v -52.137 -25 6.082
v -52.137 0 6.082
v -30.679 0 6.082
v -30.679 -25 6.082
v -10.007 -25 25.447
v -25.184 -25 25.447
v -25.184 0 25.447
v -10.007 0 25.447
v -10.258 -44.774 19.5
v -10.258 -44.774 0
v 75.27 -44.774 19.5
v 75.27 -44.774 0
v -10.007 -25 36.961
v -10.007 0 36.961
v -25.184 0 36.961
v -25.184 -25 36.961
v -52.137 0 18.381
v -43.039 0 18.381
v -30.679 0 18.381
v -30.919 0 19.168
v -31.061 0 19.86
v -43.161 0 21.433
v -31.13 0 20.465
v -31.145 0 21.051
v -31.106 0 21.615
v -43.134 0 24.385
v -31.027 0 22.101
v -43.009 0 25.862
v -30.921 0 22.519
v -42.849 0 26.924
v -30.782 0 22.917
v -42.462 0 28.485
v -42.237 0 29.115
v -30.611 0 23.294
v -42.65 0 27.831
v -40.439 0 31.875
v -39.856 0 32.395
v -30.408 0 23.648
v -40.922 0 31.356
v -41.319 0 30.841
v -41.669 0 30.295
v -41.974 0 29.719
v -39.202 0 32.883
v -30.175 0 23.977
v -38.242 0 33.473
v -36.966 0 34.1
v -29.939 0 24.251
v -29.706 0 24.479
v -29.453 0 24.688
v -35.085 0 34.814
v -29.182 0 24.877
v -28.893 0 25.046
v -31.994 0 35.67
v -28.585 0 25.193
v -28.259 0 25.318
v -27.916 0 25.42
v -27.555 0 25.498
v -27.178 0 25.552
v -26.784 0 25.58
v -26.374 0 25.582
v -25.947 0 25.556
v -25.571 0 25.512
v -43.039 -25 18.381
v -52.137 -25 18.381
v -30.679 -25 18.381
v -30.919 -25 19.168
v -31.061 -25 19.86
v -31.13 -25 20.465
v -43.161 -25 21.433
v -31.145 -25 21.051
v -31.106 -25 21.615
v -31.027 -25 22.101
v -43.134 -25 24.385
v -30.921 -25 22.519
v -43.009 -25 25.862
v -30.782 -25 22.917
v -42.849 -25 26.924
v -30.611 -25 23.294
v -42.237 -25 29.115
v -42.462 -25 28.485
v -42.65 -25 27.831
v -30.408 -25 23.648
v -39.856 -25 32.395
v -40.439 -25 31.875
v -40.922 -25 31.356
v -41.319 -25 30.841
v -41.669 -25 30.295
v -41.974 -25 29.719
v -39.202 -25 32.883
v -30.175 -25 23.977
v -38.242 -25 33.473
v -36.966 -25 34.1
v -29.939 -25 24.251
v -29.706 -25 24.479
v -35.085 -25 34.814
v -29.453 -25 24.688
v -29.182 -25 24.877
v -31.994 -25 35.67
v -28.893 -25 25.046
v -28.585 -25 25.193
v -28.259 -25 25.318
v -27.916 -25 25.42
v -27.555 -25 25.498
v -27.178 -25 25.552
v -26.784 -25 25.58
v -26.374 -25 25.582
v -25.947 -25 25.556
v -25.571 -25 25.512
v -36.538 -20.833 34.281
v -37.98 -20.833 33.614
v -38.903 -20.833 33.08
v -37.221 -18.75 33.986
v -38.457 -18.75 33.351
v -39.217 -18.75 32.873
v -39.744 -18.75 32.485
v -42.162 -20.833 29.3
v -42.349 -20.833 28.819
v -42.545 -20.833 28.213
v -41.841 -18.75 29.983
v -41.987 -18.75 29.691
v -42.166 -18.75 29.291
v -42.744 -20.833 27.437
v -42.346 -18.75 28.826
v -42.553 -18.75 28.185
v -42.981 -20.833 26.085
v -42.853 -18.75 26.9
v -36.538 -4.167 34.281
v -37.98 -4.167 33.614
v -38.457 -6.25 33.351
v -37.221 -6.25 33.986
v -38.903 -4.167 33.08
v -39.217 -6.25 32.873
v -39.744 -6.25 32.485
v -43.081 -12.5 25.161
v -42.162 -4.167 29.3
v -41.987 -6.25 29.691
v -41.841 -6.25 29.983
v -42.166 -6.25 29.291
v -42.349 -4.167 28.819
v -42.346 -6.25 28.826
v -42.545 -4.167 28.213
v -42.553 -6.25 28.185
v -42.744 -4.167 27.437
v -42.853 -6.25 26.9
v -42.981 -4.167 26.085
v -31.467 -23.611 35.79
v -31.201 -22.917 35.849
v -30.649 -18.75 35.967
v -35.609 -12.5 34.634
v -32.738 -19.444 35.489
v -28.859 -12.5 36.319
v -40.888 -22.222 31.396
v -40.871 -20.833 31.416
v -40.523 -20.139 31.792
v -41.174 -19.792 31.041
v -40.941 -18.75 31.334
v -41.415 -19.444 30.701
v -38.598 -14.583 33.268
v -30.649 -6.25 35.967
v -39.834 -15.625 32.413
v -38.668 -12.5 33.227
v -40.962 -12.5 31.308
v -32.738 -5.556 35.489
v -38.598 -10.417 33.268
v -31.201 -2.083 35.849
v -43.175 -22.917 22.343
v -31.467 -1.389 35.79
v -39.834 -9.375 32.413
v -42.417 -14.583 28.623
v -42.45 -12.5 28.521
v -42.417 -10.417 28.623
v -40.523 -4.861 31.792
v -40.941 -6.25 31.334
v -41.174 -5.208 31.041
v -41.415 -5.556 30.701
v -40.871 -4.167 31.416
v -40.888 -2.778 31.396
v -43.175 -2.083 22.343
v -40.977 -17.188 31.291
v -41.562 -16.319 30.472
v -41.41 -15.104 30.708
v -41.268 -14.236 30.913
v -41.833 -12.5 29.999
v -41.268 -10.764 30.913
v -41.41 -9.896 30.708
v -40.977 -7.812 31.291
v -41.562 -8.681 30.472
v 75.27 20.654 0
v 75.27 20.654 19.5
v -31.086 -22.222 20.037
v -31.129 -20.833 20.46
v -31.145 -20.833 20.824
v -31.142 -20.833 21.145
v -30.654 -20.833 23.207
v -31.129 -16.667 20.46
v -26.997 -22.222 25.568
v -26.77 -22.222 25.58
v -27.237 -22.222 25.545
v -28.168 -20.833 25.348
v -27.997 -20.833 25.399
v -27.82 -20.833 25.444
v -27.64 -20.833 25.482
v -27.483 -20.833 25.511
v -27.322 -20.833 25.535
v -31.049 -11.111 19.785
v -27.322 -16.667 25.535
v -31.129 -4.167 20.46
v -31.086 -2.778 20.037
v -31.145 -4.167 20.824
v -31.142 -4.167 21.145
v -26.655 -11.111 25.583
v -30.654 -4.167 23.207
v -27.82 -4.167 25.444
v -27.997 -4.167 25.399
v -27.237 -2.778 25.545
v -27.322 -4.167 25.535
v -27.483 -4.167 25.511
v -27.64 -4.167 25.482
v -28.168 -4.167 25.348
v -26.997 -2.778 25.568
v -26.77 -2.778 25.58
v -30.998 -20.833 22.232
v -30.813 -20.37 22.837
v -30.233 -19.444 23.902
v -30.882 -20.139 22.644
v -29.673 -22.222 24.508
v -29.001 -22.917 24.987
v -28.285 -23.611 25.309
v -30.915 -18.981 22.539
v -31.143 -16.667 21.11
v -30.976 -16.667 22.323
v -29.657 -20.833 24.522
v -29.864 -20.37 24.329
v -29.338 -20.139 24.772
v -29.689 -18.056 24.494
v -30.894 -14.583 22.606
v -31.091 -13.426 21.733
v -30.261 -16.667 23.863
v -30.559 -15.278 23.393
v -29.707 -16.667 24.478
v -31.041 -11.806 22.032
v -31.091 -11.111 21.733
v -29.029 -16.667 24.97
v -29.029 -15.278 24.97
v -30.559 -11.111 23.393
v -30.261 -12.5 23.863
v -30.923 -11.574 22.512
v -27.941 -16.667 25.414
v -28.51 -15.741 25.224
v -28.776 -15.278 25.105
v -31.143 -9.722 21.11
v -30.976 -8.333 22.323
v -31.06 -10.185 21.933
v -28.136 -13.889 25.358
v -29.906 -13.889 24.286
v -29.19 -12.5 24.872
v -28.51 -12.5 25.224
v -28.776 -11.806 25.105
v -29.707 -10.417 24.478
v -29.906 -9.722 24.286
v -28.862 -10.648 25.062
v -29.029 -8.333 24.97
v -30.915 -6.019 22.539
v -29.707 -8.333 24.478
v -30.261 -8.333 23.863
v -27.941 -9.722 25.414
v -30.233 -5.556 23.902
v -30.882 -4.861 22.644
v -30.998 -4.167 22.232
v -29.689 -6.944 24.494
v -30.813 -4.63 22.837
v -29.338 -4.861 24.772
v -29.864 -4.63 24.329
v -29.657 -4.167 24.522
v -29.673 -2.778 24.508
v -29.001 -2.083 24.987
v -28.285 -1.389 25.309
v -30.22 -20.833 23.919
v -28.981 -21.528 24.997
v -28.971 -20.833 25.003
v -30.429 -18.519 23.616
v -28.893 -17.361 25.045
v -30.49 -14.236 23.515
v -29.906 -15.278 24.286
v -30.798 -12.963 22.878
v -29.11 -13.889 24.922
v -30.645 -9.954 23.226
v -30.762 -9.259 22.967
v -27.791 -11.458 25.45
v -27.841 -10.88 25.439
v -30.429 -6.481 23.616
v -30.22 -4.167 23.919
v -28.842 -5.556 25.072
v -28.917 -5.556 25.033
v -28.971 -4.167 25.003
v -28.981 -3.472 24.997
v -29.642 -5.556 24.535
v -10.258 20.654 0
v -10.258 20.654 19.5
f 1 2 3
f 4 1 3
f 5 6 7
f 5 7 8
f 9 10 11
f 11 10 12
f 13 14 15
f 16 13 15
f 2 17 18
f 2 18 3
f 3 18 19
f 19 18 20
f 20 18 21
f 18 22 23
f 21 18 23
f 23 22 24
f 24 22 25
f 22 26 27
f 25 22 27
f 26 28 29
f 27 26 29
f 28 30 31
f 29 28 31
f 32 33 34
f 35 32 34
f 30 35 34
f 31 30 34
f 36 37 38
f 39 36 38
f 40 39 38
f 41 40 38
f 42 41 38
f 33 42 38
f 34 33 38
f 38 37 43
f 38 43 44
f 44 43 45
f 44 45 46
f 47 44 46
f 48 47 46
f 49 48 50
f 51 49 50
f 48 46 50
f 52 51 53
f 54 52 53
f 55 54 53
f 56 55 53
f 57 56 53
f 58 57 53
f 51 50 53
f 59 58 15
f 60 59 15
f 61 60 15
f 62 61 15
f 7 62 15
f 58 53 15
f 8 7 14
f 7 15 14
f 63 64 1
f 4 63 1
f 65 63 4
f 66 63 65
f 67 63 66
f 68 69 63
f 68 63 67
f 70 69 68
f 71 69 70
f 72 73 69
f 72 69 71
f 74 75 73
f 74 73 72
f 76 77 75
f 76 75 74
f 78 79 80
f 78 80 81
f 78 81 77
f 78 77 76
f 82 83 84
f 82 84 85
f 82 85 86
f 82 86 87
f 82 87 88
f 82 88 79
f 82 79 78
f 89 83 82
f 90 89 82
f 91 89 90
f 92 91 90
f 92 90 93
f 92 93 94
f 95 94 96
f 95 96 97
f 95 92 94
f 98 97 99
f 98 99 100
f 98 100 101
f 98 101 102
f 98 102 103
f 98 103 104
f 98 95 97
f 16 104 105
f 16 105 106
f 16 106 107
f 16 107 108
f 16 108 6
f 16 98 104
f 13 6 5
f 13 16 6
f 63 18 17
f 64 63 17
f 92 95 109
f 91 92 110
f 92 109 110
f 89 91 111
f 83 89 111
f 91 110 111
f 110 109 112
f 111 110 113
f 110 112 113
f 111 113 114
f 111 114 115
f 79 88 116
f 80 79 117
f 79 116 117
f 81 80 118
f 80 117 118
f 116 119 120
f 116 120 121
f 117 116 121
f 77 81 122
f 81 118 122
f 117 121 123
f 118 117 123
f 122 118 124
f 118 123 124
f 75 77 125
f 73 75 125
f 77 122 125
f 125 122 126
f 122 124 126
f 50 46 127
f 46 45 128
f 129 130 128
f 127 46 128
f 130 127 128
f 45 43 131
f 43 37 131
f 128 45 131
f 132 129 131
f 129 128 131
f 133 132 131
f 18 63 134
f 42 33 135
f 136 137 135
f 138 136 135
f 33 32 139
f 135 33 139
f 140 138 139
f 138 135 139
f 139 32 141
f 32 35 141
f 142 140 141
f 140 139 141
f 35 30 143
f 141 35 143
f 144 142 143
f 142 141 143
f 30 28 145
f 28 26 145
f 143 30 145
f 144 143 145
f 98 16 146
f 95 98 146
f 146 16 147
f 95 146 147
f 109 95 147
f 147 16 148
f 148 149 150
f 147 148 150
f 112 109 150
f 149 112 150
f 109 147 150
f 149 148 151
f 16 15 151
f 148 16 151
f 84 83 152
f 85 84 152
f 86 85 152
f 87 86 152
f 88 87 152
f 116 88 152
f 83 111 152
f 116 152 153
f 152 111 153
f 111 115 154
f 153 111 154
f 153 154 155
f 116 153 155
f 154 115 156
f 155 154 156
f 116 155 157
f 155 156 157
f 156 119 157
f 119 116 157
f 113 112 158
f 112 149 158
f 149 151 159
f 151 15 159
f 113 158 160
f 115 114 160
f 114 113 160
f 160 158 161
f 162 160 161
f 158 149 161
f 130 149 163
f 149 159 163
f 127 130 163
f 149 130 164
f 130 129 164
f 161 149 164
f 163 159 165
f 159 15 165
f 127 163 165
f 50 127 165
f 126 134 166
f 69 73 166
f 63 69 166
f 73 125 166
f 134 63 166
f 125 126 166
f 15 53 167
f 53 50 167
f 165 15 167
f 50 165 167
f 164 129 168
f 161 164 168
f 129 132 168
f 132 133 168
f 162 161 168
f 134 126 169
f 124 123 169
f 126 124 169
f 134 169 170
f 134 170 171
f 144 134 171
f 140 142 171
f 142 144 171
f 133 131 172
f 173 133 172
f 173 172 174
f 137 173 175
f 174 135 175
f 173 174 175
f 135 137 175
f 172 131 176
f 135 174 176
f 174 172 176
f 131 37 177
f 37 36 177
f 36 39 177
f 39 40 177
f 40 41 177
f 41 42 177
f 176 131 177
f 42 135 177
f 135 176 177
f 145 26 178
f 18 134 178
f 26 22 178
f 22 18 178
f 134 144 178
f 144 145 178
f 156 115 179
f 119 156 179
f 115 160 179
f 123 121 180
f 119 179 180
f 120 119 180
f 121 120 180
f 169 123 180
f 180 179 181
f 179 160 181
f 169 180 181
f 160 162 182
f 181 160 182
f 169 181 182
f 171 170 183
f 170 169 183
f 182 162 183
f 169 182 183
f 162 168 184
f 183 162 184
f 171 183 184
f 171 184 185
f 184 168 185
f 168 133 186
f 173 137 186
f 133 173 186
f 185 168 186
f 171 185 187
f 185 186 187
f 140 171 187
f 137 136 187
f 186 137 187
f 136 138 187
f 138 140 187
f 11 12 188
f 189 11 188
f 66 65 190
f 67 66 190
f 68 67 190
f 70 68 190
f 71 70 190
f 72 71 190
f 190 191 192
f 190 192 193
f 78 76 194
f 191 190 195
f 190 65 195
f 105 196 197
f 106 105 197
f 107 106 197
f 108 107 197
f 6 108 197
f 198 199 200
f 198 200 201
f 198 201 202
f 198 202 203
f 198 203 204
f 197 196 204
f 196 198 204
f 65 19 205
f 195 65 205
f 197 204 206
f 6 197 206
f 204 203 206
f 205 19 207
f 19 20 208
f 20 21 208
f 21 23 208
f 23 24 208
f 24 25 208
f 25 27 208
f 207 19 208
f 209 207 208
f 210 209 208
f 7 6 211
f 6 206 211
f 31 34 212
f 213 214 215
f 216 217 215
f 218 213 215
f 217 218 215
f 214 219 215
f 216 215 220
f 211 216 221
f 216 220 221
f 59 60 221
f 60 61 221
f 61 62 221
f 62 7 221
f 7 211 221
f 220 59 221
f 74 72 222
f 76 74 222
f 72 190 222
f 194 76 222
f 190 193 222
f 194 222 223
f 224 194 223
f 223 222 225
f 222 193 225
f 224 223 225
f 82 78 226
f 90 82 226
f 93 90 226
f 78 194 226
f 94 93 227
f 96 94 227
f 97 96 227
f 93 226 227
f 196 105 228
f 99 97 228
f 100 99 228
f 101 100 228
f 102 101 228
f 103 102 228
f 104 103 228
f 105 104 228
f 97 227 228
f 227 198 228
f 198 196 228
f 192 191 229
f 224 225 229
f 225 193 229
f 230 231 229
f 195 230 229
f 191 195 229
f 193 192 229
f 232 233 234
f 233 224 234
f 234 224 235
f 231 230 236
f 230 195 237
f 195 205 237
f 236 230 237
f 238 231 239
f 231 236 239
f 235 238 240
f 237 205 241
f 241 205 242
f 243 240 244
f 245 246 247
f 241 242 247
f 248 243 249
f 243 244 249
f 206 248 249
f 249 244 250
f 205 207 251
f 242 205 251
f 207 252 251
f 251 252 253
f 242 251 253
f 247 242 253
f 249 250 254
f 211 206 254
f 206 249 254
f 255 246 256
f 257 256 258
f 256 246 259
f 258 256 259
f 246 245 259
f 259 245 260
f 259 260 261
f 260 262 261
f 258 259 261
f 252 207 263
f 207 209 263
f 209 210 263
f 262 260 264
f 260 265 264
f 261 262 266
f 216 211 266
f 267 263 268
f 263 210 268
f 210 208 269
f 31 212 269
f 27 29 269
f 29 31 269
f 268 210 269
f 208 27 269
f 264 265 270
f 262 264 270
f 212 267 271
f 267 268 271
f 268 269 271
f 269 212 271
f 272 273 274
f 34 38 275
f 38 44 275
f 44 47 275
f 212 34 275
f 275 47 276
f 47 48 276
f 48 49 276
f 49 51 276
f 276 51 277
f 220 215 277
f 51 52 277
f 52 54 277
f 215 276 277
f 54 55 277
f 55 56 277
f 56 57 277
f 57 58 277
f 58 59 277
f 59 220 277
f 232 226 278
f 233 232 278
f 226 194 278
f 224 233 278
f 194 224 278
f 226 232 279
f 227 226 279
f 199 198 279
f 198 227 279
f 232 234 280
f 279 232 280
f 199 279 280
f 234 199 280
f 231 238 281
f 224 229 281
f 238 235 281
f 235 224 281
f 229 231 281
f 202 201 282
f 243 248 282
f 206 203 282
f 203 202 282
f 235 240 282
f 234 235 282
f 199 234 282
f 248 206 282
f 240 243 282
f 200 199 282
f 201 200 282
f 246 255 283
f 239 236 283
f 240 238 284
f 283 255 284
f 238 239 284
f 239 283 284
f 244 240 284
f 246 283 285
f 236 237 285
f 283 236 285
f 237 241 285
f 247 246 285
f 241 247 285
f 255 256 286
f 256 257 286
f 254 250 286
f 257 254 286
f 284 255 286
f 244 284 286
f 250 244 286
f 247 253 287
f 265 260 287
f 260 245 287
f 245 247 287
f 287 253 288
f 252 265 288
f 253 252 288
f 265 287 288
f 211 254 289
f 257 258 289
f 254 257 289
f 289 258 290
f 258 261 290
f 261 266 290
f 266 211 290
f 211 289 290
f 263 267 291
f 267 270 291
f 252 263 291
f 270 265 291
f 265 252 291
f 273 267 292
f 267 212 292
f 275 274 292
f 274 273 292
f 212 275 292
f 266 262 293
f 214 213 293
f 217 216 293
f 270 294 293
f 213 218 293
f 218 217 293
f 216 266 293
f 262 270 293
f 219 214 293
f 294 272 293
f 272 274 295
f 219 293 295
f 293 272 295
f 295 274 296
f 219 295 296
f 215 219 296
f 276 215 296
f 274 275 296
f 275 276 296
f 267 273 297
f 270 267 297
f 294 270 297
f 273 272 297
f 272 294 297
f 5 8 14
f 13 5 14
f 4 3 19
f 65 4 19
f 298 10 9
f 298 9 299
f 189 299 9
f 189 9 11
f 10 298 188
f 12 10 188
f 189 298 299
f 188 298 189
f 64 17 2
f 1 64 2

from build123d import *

# Parameters (mm, degrees)
F1_DEPTH = 25
F2_W     = 85.5280570686
F2_H     = 65.4282718897
F3_DEPTH = 19.5


with BuildPart() as f1:
    # F0 (on Front) → F1 (new body)
    with BuildSketch(Plane.XZ):
        with BuildLine():
            Line((-52.1368719637, 18.3813534677), (-52.1368719637, 6.08182))
            Line((-52.1368719637, 6.08182), (-30.679255724, 6.08182))
            Line((-30.679255724, 6.08182), (-30.679255724, 18.3813534677))
            add(Edge.make_bspline(
                [(-30.679255724, 18.3813534677), (-32.2119481862, 22.6791929454), (-29.8628807068, 26.3472329825), (-25.1840129495, 25.4470407963)],
                knots=[0, 0, 0, 0, 8.9510686834, 8.9510686834, 8.9510686834, 8.9510686834], degree=3))
            Line((-25.1840129495, 25.4470407963), (-10.0066736341, 25.4470407963))
            Line((-10.0066736341, 25.4470407963), (-10.0066736341, 36.9614958763))
            Line((-10.0066736341, 36.9614958763), (-25.1840129495, 36.9614958763))
            add(Edge.make_bspline(
                [(-25.1840129495, 36.9614958763), (-31.6314211359, 35.8709373617), (-43.7773138453, 33.8164983797), (-43.2748553138, 23.3104654925), (-43.0391170084, 18.3813534677)],
                knots=[0, 0, 0, 0, 0.530830326, 1, 1, 1, 1], degree=3))
            Line((-43.0391170084, 18.3813534677), (-52.1368719637, 18.3813534677))
        make_face()
    extrude(amount=F1_DEPTH)


with BuildPart() as f3:
    # F2 (on Top) → F3 (new body)
    with BuildSketch(Plane.XY):
        with Locations((32.5062070042, -12.0598785579)):
            Rectangle(F2_W, F2_H)
    extrude(amount=F3_DEPTH)


solid = Compound([f1.part, f3.part])
